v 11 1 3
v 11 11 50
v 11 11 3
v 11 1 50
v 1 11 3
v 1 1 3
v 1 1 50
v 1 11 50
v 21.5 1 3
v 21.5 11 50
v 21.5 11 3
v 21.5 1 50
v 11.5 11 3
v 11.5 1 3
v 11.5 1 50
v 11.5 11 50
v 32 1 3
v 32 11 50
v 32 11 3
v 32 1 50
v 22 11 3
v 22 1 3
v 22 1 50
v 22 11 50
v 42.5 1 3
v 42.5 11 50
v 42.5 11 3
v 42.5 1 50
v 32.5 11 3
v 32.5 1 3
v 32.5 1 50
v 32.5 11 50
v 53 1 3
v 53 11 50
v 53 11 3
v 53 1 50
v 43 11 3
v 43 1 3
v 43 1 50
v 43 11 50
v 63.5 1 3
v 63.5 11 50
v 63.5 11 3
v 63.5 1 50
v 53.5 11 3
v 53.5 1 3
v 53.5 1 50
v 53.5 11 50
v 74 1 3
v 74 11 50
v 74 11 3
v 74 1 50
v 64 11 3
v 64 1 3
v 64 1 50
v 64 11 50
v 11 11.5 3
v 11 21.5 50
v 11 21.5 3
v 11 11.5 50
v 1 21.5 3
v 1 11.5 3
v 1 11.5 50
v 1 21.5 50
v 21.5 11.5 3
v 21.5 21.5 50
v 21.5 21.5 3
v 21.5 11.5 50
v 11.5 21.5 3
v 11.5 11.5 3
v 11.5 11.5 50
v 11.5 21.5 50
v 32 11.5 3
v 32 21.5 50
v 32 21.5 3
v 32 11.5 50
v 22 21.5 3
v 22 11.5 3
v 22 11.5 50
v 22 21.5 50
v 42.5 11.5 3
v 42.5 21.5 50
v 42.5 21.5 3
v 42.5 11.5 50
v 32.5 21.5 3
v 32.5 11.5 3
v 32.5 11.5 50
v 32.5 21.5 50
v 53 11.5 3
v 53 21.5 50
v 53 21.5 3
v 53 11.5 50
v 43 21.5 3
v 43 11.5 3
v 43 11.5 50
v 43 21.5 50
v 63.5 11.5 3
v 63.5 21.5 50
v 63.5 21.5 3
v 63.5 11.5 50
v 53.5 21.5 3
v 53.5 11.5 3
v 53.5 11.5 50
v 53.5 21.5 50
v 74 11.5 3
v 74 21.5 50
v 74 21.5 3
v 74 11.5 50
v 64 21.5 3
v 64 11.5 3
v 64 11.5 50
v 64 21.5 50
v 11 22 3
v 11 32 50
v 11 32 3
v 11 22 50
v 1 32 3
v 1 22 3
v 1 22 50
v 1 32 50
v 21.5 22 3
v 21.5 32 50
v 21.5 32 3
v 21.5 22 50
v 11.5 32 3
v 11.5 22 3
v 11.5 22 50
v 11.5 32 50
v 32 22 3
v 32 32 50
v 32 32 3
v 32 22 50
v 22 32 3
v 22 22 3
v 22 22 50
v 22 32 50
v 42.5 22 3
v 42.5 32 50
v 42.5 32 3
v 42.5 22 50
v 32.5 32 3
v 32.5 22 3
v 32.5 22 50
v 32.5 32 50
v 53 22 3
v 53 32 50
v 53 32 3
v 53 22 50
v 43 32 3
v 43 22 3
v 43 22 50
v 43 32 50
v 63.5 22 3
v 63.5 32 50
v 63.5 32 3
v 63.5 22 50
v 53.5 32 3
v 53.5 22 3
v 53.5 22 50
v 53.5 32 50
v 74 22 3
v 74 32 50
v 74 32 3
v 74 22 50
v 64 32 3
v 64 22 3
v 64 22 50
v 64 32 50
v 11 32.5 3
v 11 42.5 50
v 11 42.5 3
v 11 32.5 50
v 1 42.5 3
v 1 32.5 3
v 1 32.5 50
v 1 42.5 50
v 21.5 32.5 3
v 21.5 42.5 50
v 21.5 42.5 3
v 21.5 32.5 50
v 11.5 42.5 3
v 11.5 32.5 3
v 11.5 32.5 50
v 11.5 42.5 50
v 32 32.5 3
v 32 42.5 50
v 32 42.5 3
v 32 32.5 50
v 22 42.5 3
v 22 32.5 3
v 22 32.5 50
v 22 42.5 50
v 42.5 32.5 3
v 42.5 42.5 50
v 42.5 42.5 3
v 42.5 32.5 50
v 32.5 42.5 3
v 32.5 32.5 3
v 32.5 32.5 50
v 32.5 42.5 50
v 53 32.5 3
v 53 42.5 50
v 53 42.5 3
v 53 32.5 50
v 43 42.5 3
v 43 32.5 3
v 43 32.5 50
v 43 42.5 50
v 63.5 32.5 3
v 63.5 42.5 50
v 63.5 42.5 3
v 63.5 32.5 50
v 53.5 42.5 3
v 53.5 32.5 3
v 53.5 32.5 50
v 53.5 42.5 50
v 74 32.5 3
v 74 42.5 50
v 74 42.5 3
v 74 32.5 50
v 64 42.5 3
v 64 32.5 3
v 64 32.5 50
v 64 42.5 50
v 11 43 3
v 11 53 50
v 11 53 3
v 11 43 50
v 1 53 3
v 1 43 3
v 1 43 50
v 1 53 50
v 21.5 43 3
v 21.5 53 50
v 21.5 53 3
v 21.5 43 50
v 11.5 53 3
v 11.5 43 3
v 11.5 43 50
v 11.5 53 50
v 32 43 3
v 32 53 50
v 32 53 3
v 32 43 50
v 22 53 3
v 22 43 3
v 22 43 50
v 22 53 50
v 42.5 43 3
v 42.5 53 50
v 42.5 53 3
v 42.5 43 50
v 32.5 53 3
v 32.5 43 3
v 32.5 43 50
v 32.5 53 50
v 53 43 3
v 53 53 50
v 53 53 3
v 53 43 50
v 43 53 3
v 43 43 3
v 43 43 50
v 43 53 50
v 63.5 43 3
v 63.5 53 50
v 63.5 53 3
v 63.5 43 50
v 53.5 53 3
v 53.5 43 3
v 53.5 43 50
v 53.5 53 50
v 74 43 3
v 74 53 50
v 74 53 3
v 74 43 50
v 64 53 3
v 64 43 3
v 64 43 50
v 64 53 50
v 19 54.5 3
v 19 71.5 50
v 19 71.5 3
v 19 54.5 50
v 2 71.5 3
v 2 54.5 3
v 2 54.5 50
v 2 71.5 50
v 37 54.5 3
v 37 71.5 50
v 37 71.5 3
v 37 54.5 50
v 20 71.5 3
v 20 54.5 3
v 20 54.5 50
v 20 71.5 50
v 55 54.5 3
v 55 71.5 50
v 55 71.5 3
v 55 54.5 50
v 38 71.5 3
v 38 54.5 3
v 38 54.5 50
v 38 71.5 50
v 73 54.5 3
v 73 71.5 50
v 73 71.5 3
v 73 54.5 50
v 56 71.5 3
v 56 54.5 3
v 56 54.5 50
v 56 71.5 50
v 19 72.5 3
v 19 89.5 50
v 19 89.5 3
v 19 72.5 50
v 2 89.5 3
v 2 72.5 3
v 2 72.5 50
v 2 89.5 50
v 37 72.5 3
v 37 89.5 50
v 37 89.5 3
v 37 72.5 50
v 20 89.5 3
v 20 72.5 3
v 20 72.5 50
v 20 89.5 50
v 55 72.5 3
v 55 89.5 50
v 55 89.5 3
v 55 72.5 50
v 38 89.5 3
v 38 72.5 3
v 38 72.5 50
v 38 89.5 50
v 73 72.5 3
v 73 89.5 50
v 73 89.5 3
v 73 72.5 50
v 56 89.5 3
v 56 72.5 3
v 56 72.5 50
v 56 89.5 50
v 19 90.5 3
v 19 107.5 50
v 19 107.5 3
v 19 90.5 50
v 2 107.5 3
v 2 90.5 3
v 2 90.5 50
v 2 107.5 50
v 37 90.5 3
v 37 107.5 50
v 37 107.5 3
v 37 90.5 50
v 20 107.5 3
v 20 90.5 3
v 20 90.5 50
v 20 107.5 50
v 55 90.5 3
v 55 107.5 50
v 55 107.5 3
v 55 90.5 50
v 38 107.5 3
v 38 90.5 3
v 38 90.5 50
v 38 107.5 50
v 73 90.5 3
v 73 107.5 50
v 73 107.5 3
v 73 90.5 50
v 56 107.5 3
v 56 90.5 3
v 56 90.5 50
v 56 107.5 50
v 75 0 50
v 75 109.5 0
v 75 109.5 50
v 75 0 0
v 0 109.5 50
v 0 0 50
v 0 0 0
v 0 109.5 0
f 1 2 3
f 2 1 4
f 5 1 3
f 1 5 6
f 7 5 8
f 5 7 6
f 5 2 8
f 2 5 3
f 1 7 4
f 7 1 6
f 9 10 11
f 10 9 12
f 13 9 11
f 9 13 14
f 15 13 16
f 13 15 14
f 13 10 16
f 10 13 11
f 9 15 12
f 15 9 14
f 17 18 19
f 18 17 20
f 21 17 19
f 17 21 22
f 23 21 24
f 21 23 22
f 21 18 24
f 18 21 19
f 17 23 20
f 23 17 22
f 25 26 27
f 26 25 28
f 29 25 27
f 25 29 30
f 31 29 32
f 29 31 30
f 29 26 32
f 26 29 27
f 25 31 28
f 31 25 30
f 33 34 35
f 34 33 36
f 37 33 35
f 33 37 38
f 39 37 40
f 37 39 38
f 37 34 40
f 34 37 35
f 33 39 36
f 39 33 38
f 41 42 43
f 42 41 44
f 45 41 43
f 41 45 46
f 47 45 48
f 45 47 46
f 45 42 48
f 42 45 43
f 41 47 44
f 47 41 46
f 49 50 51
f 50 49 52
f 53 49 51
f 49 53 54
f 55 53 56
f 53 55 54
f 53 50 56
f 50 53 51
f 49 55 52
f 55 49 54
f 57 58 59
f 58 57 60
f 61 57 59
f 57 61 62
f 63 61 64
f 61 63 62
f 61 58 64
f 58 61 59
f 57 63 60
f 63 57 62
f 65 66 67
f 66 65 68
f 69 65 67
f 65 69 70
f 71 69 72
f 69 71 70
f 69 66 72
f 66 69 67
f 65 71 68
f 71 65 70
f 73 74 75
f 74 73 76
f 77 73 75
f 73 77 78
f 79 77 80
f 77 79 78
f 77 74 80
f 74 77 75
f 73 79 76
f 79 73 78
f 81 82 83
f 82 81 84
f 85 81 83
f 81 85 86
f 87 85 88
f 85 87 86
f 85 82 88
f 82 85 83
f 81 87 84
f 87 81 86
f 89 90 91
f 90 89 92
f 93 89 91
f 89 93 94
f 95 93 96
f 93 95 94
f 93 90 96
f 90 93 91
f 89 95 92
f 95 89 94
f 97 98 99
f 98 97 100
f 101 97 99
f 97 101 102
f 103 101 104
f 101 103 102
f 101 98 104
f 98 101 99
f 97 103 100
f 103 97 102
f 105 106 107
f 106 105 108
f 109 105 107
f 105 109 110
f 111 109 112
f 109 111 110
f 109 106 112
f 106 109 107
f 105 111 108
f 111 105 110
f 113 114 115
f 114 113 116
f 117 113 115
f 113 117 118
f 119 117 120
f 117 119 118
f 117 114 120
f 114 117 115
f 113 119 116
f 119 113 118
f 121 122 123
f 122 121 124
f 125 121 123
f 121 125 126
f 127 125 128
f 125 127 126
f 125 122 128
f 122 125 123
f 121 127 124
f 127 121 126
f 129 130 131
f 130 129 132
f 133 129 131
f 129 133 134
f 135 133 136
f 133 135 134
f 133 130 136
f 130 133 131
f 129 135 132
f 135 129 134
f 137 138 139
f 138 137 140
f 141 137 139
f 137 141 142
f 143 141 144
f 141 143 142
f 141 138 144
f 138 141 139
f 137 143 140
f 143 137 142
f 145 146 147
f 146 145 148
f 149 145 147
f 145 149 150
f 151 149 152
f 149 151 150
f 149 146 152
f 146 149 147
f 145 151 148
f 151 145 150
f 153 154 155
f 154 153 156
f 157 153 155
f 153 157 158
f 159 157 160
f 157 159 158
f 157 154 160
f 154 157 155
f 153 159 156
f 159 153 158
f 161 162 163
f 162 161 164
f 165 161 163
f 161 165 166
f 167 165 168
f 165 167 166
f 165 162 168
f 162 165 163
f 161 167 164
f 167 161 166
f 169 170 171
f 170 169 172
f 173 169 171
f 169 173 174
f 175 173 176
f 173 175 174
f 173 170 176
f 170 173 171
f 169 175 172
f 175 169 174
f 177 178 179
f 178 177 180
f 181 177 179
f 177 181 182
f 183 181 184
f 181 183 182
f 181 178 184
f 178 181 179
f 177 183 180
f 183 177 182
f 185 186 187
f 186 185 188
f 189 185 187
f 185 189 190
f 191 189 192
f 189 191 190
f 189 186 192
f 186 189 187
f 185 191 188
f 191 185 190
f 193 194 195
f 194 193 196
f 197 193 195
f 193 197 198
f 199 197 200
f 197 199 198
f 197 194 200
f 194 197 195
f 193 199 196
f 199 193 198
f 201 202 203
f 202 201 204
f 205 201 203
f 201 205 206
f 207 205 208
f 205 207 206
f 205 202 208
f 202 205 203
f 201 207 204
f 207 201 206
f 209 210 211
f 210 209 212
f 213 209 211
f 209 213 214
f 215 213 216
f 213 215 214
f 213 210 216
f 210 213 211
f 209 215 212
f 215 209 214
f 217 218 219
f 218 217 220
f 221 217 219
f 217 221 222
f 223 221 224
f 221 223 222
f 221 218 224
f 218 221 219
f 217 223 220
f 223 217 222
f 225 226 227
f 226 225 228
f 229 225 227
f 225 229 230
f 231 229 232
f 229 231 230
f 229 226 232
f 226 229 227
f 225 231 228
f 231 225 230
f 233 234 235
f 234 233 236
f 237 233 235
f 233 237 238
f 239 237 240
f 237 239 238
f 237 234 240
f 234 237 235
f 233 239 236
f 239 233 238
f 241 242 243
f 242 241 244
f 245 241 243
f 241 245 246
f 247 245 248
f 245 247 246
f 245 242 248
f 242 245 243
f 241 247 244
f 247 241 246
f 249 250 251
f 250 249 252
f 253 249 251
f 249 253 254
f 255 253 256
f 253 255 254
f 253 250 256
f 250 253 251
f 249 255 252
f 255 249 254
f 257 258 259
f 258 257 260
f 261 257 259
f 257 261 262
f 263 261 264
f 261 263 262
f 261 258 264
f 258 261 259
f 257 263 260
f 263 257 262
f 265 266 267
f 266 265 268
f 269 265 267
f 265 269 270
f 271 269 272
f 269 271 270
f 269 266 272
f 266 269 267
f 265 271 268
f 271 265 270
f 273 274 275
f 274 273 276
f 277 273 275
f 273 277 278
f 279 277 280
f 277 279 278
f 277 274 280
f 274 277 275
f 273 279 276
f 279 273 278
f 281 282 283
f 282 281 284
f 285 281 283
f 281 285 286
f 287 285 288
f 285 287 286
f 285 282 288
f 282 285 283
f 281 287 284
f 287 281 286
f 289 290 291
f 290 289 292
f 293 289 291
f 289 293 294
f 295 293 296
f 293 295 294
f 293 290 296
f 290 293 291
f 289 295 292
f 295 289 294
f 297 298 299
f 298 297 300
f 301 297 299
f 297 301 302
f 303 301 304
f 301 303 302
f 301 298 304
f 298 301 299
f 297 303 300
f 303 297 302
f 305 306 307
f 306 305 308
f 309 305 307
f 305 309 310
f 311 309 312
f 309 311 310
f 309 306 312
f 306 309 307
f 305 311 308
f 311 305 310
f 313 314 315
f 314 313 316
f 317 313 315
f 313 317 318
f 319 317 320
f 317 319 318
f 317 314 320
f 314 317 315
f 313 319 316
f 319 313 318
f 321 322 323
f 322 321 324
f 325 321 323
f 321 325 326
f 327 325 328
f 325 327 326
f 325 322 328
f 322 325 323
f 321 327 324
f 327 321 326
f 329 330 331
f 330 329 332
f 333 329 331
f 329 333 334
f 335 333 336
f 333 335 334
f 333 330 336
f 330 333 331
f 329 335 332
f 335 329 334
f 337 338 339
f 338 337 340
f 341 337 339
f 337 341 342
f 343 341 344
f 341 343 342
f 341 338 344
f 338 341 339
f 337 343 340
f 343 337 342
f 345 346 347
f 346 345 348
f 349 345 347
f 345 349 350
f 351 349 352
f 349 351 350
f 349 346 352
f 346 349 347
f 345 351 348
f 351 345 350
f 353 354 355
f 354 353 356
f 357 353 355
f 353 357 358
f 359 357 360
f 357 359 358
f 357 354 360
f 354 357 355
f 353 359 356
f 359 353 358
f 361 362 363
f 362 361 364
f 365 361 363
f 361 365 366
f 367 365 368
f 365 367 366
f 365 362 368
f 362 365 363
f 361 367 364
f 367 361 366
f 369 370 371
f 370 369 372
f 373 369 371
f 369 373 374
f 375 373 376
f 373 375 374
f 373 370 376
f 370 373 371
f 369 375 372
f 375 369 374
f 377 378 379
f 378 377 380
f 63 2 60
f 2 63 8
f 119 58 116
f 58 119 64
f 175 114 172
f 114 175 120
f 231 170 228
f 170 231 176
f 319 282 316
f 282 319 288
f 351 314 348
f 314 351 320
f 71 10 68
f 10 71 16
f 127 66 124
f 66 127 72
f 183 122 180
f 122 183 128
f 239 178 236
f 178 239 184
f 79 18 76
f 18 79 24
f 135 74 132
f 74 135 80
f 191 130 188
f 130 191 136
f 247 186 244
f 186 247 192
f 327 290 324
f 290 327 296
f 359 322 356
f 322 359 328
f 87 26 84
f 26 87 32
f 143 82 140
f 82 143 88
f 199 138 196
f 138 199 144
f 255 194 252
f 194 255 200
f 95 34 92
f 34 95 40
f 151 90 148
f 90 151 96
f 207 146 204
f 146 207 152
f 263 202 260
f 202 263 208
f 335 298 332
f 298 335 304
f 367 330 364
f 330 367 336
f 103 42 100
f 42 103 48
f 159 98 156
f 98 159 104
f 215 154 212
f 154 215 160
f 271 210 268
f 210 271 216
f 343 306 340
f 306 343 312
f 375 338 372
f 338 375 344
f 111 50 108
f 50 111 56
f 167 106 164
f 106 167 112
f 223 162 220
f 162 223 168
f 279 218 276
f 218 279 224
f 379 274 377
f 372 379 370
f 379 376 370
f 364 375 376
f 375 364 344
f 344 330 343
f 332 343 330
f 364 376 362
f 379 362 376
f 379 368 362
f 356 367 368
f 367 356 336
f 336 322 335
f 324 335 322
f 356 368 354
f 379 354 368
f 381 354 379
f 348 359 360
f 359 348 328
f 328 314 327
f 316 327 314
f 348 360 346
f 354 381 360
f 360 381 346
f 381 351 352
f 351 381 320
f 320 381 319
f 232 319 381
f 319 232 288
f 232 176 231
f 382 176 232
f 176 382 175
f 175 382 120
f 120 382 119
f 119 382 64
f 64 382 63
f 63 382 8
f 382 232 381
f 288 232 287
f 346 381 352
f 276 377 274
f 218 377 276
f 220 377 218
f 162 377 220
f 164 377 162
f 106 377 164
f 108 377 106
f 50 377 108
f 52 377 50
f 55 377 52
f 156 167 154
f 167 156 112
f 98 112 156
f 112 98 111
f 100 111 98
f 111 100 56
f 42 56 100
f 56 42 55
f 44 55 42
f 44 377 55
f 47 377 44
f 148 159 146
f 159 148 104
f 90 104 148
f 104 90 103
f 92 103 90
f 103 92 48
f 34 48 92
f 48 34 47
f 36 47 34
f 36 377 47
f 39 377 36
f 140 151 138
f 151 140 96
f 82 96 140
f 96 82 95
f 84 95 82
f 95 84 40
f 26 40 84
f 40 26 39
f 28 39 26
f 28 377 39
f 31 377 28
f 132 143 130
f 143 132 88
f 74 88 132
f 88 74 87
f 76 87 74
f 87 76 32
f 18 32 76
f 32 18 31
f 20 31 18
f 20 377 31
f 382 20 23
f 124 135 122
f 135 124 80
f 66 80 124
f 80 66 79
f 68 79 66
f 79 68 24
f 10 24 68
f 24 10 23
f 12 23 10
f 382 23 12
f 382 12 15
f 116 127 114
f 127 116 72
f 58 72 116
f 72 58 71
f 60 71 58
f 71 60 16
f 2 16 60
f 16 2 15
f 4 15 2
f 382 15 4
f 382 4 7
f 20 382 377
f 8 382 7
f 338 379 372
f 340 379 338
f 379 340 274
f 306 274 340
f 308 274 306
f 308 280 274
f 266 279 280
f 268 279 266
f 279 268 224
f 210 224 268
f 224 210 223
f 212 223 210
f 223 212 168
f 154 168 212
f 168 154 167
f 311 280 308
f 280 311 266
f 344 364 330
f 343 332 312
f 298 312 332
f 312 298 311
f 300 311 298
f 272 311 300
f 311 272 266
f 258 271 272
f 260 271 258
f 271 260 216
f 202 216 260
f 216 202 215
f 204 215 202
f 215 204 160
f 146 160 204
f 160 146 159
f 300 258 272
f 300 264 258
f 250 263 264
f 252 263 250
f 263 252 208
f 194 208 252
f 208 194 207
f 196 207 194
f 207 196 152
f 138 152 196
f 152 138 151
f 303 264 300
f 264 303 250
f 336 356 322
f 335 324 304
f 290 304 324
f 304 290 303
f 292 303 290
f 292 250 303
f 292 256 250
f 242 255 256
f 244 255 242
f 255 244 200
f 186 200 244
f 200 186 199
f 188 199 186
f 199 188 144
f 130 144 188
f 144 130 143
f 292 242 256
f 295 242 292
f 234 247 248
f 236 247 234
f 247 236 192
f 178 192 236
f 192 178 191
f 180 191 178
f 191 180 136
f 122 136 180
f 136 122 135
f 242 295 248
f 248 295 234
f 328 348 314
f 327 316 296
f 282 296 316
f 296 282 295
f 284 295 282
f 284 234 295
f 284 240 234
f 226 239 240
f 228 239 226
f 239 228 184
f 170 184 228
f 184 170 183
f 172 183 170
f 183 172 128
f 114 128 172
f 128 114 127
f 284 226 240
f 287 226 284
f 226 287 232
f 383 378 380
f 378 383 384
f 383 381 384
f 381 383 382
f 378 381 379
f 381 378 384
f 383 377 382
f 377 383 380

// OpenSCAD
// Small Tool Organizer
// (c) 2021, 2023 Ed Paradis

/* [Overall] */
height=50;

/* [Large pockets] */
large_pocket_size = 17;
large_pocket_rows = 3;
large_pocket_cols = 4;

/* [Small pockets] */
small_pocket_size = 10;
small_pocket_rows = 5;
small_pocket_cols = 7;

/* [Pocket shape] */
shape="square"; // [square, circle] 

module __stop_customizer__() {}

overall_x=small_pocket_cols*(small_pocket_size+0.5)+1.5;
overall_y=large_pocket_rows*(large_pocket_size+1)
  + small_pocket_rows*(small_pocket_size+0.5)
  + 3;

echo(str("overall_x=", overall_x));
echo(str("overall_y=", overall_y));

module material() {
    cube([overall_x, overall_y, height]);
}

module cutout(size) {
    if(shape=="square") {
        cube([size,size,height*2], center=true);
    } else {
        cylinder(h=height*2, d=size, center=true, $fn=64);
    }
}

module small_cutouts() {
    d=small_pocket_size;
    x0=d/2+1;
    y0=x0;
    xstep=small_pocket_size + 0.5;
    ystep=xstep;
 
    for (y=[0:small_pocket_rows-1]) {
        for (x=[0:small_pocket_cols-1]) {
            translate([x*xstep+x0, y*ystep+y0, height+3]) {
                cutout(d);
            }
        }
    }
}

module large_cutouts() {
    d=large_pocket_size;
    w=d*large_pocket_cols+(1*(large_pocket_cols-1));
    border=(overall_x - w)/2;
    x0=d/2+border;
    y0=small_pocket_rows*(small_pocket_size+0.5)+(d/2+2);
    xstep=d+1;
    ystep=xstep;

    for (y=[0:large_pocket_rows-1]) {
        for (x=[0:large_pocket_cols-1]) {
            translate([x*xstep+x0, y*ystep+y0, height+3]) {
                cutout(d);
            }
        }
    }
}

difference() {
    material();
    union() {
        small_cutouts();
        large_cutouts();
    }
}
